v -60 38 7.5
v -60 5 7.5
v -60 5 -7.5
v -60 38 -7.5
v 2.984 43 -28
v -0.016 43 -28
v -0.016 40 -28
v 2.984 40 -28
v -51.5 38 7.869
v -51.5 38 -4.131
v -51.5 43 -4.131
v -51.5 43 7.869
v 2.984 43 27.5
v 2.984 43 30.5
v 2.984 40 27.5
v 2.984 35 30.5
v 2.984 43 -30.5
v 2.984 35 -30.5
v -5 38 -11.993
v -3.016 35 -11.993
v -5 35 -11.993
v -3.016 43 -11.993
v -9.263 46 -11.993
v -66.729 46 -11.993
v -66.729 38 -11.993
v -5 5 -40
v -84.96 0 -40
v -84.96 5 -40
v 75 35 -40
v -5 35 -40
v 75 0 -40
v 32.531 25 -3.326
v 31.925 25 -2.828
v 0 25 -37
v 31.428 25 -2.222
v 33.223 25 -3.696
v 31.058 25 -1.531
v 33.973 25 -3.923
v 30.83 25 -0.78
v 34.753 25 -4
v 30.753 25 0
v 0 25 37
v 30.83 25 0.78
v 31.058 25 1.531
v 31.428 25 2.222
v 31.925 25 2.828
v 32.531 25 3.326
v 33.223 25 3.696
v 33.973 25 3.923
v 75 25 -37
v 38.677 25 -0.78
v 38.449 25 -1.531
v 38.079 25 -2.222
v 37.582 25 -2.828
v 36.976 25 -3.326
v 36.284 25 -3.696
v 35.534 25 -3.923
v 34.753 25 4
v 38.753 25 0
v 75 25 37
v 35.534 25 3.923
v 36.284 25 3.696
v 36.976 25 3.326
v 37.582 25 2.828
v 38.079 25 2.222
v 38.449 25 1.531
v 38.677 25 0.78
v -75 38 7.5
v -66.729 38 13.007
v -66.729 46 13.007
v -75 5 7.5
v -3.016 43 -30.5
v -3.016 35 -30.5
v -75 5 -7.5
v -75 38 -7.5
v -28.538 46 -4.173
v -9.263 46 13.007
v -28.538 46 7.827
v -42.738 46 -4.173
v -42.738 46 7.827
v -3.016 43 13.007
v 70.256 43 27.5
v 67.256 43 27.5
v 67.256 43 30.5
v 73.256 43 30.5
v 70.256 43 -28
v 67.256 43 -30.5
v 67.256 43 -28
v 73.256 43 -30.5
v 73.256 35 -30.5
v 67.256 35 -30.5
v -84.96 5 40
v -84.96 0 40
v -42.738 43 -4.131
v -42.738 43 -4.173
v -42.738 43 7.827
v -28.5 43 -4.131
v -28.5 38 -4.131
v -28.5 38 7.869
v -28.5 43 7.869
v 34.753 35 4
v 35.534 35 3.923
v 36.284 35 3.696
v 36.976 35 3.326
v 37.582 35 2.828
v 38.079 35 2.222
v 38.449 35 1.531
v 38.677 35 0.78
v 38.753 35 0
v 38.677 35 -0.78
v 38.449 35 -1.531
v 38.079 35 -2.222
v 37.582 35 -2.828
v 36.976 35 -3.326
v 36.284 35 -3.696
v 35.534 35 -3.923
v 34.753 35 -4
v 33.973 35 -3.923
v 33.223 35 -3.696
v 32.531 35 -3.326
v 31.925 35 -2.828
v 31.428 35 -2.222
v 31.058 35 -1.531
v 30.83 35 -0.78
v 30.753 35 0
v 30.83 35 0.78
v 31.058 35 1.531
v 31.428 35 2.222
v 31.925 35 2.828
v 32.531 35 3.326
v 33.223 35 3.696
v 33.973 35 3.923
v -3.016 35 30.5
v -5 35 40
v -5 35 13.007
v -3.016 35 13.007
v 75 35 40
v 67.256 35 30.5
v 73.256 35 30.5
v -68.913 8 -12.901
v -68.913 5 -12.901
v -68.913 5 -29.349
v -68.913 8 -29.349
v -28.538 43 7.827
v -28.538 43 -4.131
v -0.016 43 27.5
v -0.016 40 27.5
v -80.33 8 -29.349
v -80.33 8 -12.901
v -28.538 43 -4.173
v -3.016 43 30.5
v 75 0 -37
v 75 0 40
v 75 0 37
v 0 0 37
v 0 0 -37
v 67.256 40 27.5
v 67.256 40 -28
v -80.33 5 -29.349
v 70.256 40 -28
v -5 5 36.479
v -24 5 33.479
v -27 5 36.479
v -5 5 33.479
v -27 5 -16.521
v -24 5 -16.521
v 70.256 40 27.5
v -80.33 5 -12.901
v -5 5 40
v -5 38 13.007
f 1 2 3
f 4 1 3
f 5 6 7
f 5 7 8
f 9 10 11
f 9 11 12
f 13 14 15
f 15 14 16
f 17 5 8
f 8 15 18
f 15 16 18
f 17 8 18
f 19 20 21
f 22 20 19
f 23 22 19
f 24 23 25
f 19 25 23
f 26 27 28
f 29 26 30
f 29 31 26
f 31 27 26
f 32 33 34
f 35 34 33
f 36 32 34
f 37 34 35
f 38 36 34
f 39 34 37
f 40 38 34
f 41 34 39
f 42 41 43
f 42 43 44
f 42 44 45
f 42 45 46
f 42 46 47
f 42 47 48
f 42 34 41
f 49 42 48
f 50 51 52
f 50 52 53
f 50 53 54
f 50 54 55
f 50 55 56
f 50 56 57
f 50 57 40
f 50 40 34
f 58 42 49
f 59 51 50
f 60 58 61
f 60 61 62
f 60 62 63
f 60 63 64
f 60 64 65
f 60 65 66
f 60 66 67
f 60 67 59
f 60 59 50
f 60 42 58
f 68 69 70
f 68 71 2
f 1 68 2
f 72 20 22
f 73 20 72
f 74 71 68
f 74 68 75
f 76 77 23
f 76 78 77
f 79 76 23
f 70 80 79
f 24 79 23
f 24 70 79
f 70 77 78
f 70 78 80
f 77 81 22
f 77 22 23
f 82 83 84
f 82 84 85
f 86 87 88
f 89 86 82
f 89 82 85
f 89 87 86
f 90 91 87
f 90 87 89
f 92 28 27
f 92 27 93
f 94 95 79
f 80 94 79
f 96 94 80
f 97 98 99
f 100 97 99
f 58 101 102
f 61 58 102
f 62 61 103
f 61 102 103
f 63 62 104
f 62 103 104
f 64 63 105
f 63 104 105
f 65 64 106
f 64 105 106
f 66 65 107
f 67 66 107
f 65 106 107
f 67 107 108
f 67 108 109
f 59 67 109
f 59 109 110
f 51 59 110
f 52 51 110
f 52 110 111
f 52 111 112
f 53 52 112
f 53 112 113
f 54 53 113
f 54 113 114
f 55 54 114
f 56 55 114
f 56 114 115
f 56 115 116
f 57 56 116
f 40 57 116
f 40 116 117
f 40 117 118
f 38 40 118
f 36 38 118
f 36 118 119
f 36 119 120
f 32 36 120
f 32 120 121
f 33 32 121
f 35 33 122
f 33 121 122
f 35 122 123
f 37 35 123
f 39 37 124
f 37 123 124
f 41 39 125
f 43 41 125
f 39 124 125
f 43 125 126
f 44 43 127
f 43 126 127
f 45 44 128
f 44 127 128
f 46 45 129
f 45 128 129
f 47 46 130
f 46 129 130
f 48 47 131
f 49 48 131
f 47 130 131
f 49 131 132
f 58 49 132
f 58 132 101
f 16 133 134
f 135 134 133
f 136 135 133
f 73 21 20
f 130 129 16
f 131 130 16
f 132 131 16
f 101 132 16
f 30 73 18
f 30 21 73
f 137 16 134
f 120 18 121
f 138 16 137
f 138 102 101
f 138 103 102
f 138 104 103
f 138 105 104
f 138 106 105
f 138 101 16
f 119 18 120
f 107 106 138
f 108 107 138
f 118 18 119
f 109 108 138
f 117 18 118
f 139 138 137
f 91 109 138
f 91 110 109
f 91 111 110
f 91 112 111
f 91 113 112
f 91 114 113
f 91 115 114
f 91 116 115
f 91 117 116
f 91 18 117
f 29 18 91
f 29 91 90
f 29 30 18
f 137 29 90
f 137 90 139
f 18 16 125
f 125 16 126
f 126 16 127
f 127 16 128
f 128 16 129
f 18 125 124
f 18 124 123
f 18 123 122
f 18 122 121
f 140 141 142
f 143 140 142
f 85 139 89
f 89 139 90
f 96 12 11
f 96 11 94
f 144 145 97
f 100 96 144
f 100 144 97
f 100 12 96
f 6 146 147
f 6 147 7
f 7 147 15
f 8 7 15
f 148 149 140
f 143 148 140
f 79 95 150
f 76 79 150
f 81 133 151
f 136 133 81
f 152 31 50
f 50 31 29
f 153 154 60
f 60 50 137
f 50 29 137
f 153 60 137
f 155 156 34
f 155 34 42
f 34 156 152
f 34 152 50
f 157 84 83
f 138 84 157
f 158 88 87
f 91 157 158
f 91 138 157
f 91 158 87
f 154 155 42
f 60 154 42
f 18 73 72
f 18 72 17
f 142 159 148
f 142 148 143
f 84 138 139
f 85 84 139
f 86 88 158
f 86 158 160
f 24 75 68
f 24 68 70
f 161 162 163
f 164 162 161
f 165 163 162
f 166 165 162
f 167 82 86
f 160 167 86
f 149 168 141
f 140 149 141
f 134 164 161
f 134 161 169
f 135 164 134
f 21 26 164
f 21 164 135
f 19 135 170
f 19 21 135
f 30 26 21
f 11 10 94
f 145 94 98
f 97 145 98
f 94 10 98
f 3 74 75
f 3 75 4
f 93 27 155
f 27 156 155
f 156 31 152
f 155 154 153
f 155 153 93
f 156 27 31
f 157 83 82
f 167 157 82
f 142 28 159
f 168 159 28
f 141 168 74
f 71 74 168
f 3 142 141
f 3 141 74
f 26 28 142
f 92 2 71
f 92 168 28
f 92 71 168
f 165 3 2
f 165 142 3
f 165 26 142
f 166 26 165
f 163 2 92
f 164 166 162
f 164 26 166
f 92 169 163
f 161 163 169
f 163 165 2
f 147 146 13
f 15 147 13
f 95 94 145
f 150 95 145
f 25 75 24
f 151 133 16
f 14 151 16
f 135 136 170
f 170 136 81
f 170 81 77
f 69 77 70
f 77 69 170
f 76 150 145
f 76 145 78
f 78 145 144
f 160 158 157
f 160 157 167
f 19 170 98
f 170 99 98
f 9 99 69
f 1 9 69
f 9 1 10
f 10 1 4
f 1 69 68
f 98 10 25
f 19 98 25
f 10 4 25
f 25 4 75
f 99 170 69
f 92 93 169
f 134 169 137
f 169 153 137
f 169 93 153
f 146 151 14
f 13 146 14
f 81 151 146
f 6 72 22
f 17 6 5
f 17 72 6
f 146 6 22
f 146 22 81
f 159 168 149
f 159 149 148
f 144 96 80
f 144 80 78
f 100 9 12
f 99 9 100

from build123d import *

# Parameters (mm, degrees)
ESQUISSE1_W                  = 150
ESQUISSE1_H                  = 80
BOSS_EXTRU_1_DEPTH           = 5
ESQUISSE2_W                  = 80
ESQUISSE2_H                  = 80
BOSS_EXTRU_2_DEPTH           = 30
ESQUISSE3_W                  = 75
ESQUISSE3_H                  = 80
ENL_V_MAT_EXTRU_1_DEPTH      = 25
ESQUISSE6_R                  = 4
ENL_V_MAT_EXTRU_2_DEPTH      = 40
ESQUISSE7_W                  = 6
ESQUISSE7_H                  = 61
BOSS_EXTRU_3_DEPTH           = 8
ESQUISSE9_W                  = 3
ESQUISSE9_H                  = 50
BOSS_EXTRU_4_DEPTH           = 0.0001
ESQUISSE10_W                 = 3
ESQUISSE10_H                 = 55.5
ENL_V_MAT_EXTRU_3_DEPTH      = 3
ESQUISSE11_W                 = 3
ESQUISSE11_H                 = 55.5
ENL_V_MAT_EXTRU_4_DEPTH      = 3
ESQUISSE12_W                 = 15
ESQUISSE12_H                 = 15
BOSS_EXTRU_5_DEPTH           = 40
BOSS_EXTRU_6_DEPTH           = 1
BOSS_EXTRU_6_DEPTH_BACK      = 7
ESQUISSE13_W                 = 44
ESQUISSE13_H                 = 25
BOSS_EXTRU_7_DEPTH           = 1
BOSS_EXTRU_7_DEPTH_BACK      = 7
ESQUISSE16_W                 = 23
ESQUISSE16_H                 = 12
ENL_V_MAT_EXTRU_5_DEPTH      = 5
ESQUISSE18_W                 = 14.2
ESQUISSE18_H                 = 12
ENL_V_MAT_EXTRU_7_DEPTH      = 5
ESQUISSE19_W                 = 25
ESQUISSE19_H                 = 8
BOSS_EXTRU_8_DEPTH           = 20
ENL_V_MAT_EXTRU_8_DEPTH      = 103.197148685
ESQUISSE21_W                 = 1.984335448
ESQUISSE21_H                 = 3
BOSS_EXTRU_9_DEPTH           = 25
ESQUISSE22_W                 = 3
ESQUISSE22_H                 = 25
BOSS_EXTRU_10_DEPTH          = 75
ESQUISSE23_W                 = 80
ESQUISSE23_H                 = 5
BOSS_EXTRU_11_DEPTH          = 9.96
ESQUISSE24_W                 = 11.416766346
ESQUISSE24_H                 = 16.447883718
BOSS_EXTRU_12_DEPTH          = 3
ENL_V_MAT_EXTRU_9_DEPTH      = 108.658959683
ENL_V_MAT_EXTRU_9_DEPTH_BACK = 108.658959683


with BuildPart() as part:
    # Esquisse1 → Boss.-Extru.1 (new body)
    with BuildSketch(Plane(origin=(0, 0, 0), x_dir=(1, 0, 0), z_dir=(0, 1, 0))):
        Rectangle(ESQUISSE1_W, ESQUISSE1_H)
    extrude(amount=BOSS_EXTRU_1_DEPTH)

    # Esquisse2 → Boss.-Extru.2 (add)
    with BuildSketch(Plane(origin=(0, 5, 0), x_dir=(1, 0, 0), z_dir=(0, 1, 0))):
        with Locations((35, 0)):
            Rectangle(ESQUISSE2_W, ESQUISSE2_H)
    extrude(amount=BOSS_EXTRU_2_DEPTH)

    # Esquisse3 → Enlèv. mat.-Extru.1 (cut)
    with BuildSketch(Plane.XZ):
        with Locations((37.5, 0)):
            Rectangle(ESQUISSE3_W, ESQUISSE3_H)
    extrude(amount=-ENL_V_MAT_EXTRU_1_DEPTH, mode=Mode.SUBTRACT)

    # Esquisse6 → Enlèv. mat.-Extru.2 (cut)
    with BuildSketch(Plane(origin=(0, 35, 0), x_dir=(1, 0, 0), z_dir=(0, 1, 0))):
        with Locations(Location((34.753416048, 0, 0), (0, 0, 270))):
            Circle(ESQUISSE6_R)
    extrude(amount=-ENL_V_MAT_EXTRU_2_DEPTH, mode=Mode.SUBTRACT)

    # Esquisse7 → Boss.-Extru.3 (add)
    with BuildSketch(Plane(origin=(0, 35, 0), x_dir=(1, 0, 0), z_dir=(0, 1, 0))):
        with Locations((-0.015664552, 0)):
            Rectangle(ESQUISSE7_W, ESQUISSE7_H)
        with Locations((70.25575127, 0)):
            Rectangle(ESQUISSE7_W, ESQUISSE7_H)
    extrude(amount=BOSS_EXTRU_3_DEPTH)

    # Esquisse9 → Boss.-Extru.4 (add)
    with BuildSketch(Plane(origin=(0, 5, 0), x_dir=(1, 0, 0), z_dir=(0, 1, 0))):
        Polygon((-27, -36.47894853), (-5, -36.47894853), (-5, -33.47894853), (-24, -33.47894853), (-27, -33.47894853), align=None)
        with Locations((-25.5, -8.47894853)):
            Rectangle(ESQUISSE9_W, ESQUISSE9_H)
    extrude(amount=BOSS_EXTRU_4_DEPTH)

    # Esquisse10 → Enlèv. mat.-Extru.3 (cut)
    with BuildSketch(Plane(origin=(0, 43, 0), x_dir=(1, 0, 0), z_dir=(0, 1, 0))):
        with Locations((1.484335448, 0.25)):
            Rectangle(ESQUISSE10_W, ESQUISSE10_H)
    extrude(amount=-ENL_V_MAT_EXTRU_3_DEPTH, mode=Mode.SUBTRACT)

    # Esquisse11 → Enlèv. mat.-Extru.4 (cut)
    with BuildSketch(Plane(origin=(0, 43, 0), x_dir=(1, 0, 0), z_dir=(0, 1, 0))):
        with Locations((68.75575127, 0.25)):
            Rectangle(ESQUISSE11_W, ESQUISSE11_H)
    extrude(amount=-ENL_V_MAT_EXTRU_4_DEPTH, mode=Mode.SUBTRACT)

    # Esquisse12 → Boss.-Extru.5 (add)
    with BuildSketch(Plane(origin=(0, 5, 0), x_dir=(1, 0, 0), z_dir=(0, 1, 0))):
        with Locations((-67.5, 0)):
            Rectangle(ESQUISSE12_W, ESQUISSE12_H)
    extrude(amount=BOSS_EXTRU_5_DEPTH)

    # Esquisse13 → Boss.-Extru.6 (add, two sides: drawn at the far end of the back side and taken through both)
    with BuildSketch(Plane(origin=(0, 45, 0), x_dir=(1, 0, 0), z_dir=(0, 1, 0)).offset(-BOSS_EXTRU_6_DEPTH_BACK)):
        with Locations((-44.729487472, -0.507142805)):
            Rectangle(ESQUISSE13_W, ESQUISSE13_H)
    extrude(amount=BOSS_EXTRU_6_DEPTH + BOSS_EXTRU_6_DEPTH_BACK)

    # Esquisse14 → Boss.-Extru.7 (add, two sides: drawn at the far end of the back side and taken through both)
    with BuildSketch(Plane(origin=(0, 45, 0), x_dir=(1, 0, 0), z_dir=(0, 1, 0)).offset(-BOSS_EXTRU_7_DEPTH_BACK)):
        Polygon((-66.729487472, -13.007142805), (-75, -7.5), (-75, 7.5), (-66.729487472, 11.992857195), align=None)
    extrude(amount=BOSS_EXTRU_7_DEPTH + BOSS_EXTRU_7_DEPTH_BACK)

    # Esquisse16 → Enlèv. mat.-Extru.5 (cut)
    with BuildSketch(Plane.XZ.offset(-38)):
        with Locations((-40, 1.869279691)):
            Rectangle(ESQUISSE16_W, ESQUISSE16_H)
    extrude(amount=-ENL_V_MAT_EXTRU_5_DEPTH, mode=Mode.SUBTRACT)

    # Esquisse18 → Enlèv. mat.-Extru.7 (cut)
    with BuildSketch(Plane.XZ.offset(-43)):
        with Locations((-35.637534585, 1.827095349)):
            Rectangle(ESQUISSE18_W, ESQUISSE18_H)
    extrude(amount=-ENL_V_MAT_EXTRU_7_DEPTH, mode=Mode.SUBTRACT)

    # Esquisse19 → Boss.-Extru.8 (add)
    with BuildSketch(Plane(origin=(-22.729487472, 0, 0), x_dir=(0, 0, -1), z_dir=(1, 0, 0))):
        with Locations((-0.507142805, 42)):
            Rectangle(ESQUISSE19_W, ESQUISSE19_H)
    extrude(amount=BOSS_EXTRU_8_DEPTH)

    # Esquisse20 → Enlèv. mat.-Extru.8 (cut, through all)
    with BuildSketch(Plane(origin=(0, 0, -11.992857195), x_dir=(-1, 0, 0), z_dir=(0, 0, -1))):
        Polygon((3.015664552, 43), (9.263117513, 46), (2.729487472, 46), (2.729487472, 43), align=None)
    extrude(amount=-ENL_V_MAT_EXTRU_8_DEPTH, mode=Mode.SUBTRACT)

    # Esquisse21 → Boss.-Extru.9 (add)
    with BuildSketch(Plane(origin=(0, 0, -11.992857195), x_dir=(-1, 0, 0), z_dir=(0, 0, -1))):
        with Locations((4.007832276, 36.5)):
            Rectangle(ESQUISSE21_W, ESQUISSE21_H)
    extrude(amount=-BOSS_EXTRU_9_DEPTH)

    # Esquisse22 → Boss.-Extru.10 (add)
    with BuildSketch(Plane(origin=(0, 0, 0), x_dir=(0, 0, -1), z_dir=(1, 0, 0))):
        with Locations((-38.5, 12.5)):
            Rectangle(ESQUISSE22_W, ESQUISSE22_H)
    boss_extru_10 = extrude(amount=BOSS_EXTRU_10_DEPTH)

    # Symétrie1: Boss.-Extru.10 across plane
    add(boss_extru_10.mirror(Plane.XY))

    # Esquisse23 → Boss.-Extru.11 (add)
    with BuildSketch(Plane.ZY.offset(75)):
        with Locations((0, 2.5)):
            Rectangle(ESQUISSE23_W, ESQUISSE23_H)
    extrude(amount=BOSS_EXTRU_11_DEPTH)

    # Esquisse24 → Boss.-Extru.12 (add)
    with BuildSketch(Plane(origin=(0, 5, 4.193760708), x_dir=(1, 0, 0), z_dir=(0, 1, 0))):
        with Locations((-74.621764305, 25.318857606)):
            Rectangle(ESQUISSE24_W, ESQUISSE24_H)
    extrude(amount=BOSS_EXTRU_12_DEPTH)

    # Esquisse25 → Enlèv. mat.-Extru.9 (cut, two sides: drawn at the far end of the back side and taken through both)
    with BuildSketch(Plane.XY.offset(7.5).offset(-ENL_V_MAT_EXTRU_9_DEPTH_BACK)):
        Polygon((-304.628474167, -184.117769245), (-75, 38), (-66.729487472, 46), (162.898986696, 268.117769245), (-281.336551795, 727.37471758), (-748.864012658, 275.139179089), align=None)
    extrude(amount=ENL_V_MAT_EXTRU_9_DEPTH + ENL_V_MAT_EXTRU_9_DEPTH_BACK, mode=Mode.SUBTRACT)


solid = part.part
